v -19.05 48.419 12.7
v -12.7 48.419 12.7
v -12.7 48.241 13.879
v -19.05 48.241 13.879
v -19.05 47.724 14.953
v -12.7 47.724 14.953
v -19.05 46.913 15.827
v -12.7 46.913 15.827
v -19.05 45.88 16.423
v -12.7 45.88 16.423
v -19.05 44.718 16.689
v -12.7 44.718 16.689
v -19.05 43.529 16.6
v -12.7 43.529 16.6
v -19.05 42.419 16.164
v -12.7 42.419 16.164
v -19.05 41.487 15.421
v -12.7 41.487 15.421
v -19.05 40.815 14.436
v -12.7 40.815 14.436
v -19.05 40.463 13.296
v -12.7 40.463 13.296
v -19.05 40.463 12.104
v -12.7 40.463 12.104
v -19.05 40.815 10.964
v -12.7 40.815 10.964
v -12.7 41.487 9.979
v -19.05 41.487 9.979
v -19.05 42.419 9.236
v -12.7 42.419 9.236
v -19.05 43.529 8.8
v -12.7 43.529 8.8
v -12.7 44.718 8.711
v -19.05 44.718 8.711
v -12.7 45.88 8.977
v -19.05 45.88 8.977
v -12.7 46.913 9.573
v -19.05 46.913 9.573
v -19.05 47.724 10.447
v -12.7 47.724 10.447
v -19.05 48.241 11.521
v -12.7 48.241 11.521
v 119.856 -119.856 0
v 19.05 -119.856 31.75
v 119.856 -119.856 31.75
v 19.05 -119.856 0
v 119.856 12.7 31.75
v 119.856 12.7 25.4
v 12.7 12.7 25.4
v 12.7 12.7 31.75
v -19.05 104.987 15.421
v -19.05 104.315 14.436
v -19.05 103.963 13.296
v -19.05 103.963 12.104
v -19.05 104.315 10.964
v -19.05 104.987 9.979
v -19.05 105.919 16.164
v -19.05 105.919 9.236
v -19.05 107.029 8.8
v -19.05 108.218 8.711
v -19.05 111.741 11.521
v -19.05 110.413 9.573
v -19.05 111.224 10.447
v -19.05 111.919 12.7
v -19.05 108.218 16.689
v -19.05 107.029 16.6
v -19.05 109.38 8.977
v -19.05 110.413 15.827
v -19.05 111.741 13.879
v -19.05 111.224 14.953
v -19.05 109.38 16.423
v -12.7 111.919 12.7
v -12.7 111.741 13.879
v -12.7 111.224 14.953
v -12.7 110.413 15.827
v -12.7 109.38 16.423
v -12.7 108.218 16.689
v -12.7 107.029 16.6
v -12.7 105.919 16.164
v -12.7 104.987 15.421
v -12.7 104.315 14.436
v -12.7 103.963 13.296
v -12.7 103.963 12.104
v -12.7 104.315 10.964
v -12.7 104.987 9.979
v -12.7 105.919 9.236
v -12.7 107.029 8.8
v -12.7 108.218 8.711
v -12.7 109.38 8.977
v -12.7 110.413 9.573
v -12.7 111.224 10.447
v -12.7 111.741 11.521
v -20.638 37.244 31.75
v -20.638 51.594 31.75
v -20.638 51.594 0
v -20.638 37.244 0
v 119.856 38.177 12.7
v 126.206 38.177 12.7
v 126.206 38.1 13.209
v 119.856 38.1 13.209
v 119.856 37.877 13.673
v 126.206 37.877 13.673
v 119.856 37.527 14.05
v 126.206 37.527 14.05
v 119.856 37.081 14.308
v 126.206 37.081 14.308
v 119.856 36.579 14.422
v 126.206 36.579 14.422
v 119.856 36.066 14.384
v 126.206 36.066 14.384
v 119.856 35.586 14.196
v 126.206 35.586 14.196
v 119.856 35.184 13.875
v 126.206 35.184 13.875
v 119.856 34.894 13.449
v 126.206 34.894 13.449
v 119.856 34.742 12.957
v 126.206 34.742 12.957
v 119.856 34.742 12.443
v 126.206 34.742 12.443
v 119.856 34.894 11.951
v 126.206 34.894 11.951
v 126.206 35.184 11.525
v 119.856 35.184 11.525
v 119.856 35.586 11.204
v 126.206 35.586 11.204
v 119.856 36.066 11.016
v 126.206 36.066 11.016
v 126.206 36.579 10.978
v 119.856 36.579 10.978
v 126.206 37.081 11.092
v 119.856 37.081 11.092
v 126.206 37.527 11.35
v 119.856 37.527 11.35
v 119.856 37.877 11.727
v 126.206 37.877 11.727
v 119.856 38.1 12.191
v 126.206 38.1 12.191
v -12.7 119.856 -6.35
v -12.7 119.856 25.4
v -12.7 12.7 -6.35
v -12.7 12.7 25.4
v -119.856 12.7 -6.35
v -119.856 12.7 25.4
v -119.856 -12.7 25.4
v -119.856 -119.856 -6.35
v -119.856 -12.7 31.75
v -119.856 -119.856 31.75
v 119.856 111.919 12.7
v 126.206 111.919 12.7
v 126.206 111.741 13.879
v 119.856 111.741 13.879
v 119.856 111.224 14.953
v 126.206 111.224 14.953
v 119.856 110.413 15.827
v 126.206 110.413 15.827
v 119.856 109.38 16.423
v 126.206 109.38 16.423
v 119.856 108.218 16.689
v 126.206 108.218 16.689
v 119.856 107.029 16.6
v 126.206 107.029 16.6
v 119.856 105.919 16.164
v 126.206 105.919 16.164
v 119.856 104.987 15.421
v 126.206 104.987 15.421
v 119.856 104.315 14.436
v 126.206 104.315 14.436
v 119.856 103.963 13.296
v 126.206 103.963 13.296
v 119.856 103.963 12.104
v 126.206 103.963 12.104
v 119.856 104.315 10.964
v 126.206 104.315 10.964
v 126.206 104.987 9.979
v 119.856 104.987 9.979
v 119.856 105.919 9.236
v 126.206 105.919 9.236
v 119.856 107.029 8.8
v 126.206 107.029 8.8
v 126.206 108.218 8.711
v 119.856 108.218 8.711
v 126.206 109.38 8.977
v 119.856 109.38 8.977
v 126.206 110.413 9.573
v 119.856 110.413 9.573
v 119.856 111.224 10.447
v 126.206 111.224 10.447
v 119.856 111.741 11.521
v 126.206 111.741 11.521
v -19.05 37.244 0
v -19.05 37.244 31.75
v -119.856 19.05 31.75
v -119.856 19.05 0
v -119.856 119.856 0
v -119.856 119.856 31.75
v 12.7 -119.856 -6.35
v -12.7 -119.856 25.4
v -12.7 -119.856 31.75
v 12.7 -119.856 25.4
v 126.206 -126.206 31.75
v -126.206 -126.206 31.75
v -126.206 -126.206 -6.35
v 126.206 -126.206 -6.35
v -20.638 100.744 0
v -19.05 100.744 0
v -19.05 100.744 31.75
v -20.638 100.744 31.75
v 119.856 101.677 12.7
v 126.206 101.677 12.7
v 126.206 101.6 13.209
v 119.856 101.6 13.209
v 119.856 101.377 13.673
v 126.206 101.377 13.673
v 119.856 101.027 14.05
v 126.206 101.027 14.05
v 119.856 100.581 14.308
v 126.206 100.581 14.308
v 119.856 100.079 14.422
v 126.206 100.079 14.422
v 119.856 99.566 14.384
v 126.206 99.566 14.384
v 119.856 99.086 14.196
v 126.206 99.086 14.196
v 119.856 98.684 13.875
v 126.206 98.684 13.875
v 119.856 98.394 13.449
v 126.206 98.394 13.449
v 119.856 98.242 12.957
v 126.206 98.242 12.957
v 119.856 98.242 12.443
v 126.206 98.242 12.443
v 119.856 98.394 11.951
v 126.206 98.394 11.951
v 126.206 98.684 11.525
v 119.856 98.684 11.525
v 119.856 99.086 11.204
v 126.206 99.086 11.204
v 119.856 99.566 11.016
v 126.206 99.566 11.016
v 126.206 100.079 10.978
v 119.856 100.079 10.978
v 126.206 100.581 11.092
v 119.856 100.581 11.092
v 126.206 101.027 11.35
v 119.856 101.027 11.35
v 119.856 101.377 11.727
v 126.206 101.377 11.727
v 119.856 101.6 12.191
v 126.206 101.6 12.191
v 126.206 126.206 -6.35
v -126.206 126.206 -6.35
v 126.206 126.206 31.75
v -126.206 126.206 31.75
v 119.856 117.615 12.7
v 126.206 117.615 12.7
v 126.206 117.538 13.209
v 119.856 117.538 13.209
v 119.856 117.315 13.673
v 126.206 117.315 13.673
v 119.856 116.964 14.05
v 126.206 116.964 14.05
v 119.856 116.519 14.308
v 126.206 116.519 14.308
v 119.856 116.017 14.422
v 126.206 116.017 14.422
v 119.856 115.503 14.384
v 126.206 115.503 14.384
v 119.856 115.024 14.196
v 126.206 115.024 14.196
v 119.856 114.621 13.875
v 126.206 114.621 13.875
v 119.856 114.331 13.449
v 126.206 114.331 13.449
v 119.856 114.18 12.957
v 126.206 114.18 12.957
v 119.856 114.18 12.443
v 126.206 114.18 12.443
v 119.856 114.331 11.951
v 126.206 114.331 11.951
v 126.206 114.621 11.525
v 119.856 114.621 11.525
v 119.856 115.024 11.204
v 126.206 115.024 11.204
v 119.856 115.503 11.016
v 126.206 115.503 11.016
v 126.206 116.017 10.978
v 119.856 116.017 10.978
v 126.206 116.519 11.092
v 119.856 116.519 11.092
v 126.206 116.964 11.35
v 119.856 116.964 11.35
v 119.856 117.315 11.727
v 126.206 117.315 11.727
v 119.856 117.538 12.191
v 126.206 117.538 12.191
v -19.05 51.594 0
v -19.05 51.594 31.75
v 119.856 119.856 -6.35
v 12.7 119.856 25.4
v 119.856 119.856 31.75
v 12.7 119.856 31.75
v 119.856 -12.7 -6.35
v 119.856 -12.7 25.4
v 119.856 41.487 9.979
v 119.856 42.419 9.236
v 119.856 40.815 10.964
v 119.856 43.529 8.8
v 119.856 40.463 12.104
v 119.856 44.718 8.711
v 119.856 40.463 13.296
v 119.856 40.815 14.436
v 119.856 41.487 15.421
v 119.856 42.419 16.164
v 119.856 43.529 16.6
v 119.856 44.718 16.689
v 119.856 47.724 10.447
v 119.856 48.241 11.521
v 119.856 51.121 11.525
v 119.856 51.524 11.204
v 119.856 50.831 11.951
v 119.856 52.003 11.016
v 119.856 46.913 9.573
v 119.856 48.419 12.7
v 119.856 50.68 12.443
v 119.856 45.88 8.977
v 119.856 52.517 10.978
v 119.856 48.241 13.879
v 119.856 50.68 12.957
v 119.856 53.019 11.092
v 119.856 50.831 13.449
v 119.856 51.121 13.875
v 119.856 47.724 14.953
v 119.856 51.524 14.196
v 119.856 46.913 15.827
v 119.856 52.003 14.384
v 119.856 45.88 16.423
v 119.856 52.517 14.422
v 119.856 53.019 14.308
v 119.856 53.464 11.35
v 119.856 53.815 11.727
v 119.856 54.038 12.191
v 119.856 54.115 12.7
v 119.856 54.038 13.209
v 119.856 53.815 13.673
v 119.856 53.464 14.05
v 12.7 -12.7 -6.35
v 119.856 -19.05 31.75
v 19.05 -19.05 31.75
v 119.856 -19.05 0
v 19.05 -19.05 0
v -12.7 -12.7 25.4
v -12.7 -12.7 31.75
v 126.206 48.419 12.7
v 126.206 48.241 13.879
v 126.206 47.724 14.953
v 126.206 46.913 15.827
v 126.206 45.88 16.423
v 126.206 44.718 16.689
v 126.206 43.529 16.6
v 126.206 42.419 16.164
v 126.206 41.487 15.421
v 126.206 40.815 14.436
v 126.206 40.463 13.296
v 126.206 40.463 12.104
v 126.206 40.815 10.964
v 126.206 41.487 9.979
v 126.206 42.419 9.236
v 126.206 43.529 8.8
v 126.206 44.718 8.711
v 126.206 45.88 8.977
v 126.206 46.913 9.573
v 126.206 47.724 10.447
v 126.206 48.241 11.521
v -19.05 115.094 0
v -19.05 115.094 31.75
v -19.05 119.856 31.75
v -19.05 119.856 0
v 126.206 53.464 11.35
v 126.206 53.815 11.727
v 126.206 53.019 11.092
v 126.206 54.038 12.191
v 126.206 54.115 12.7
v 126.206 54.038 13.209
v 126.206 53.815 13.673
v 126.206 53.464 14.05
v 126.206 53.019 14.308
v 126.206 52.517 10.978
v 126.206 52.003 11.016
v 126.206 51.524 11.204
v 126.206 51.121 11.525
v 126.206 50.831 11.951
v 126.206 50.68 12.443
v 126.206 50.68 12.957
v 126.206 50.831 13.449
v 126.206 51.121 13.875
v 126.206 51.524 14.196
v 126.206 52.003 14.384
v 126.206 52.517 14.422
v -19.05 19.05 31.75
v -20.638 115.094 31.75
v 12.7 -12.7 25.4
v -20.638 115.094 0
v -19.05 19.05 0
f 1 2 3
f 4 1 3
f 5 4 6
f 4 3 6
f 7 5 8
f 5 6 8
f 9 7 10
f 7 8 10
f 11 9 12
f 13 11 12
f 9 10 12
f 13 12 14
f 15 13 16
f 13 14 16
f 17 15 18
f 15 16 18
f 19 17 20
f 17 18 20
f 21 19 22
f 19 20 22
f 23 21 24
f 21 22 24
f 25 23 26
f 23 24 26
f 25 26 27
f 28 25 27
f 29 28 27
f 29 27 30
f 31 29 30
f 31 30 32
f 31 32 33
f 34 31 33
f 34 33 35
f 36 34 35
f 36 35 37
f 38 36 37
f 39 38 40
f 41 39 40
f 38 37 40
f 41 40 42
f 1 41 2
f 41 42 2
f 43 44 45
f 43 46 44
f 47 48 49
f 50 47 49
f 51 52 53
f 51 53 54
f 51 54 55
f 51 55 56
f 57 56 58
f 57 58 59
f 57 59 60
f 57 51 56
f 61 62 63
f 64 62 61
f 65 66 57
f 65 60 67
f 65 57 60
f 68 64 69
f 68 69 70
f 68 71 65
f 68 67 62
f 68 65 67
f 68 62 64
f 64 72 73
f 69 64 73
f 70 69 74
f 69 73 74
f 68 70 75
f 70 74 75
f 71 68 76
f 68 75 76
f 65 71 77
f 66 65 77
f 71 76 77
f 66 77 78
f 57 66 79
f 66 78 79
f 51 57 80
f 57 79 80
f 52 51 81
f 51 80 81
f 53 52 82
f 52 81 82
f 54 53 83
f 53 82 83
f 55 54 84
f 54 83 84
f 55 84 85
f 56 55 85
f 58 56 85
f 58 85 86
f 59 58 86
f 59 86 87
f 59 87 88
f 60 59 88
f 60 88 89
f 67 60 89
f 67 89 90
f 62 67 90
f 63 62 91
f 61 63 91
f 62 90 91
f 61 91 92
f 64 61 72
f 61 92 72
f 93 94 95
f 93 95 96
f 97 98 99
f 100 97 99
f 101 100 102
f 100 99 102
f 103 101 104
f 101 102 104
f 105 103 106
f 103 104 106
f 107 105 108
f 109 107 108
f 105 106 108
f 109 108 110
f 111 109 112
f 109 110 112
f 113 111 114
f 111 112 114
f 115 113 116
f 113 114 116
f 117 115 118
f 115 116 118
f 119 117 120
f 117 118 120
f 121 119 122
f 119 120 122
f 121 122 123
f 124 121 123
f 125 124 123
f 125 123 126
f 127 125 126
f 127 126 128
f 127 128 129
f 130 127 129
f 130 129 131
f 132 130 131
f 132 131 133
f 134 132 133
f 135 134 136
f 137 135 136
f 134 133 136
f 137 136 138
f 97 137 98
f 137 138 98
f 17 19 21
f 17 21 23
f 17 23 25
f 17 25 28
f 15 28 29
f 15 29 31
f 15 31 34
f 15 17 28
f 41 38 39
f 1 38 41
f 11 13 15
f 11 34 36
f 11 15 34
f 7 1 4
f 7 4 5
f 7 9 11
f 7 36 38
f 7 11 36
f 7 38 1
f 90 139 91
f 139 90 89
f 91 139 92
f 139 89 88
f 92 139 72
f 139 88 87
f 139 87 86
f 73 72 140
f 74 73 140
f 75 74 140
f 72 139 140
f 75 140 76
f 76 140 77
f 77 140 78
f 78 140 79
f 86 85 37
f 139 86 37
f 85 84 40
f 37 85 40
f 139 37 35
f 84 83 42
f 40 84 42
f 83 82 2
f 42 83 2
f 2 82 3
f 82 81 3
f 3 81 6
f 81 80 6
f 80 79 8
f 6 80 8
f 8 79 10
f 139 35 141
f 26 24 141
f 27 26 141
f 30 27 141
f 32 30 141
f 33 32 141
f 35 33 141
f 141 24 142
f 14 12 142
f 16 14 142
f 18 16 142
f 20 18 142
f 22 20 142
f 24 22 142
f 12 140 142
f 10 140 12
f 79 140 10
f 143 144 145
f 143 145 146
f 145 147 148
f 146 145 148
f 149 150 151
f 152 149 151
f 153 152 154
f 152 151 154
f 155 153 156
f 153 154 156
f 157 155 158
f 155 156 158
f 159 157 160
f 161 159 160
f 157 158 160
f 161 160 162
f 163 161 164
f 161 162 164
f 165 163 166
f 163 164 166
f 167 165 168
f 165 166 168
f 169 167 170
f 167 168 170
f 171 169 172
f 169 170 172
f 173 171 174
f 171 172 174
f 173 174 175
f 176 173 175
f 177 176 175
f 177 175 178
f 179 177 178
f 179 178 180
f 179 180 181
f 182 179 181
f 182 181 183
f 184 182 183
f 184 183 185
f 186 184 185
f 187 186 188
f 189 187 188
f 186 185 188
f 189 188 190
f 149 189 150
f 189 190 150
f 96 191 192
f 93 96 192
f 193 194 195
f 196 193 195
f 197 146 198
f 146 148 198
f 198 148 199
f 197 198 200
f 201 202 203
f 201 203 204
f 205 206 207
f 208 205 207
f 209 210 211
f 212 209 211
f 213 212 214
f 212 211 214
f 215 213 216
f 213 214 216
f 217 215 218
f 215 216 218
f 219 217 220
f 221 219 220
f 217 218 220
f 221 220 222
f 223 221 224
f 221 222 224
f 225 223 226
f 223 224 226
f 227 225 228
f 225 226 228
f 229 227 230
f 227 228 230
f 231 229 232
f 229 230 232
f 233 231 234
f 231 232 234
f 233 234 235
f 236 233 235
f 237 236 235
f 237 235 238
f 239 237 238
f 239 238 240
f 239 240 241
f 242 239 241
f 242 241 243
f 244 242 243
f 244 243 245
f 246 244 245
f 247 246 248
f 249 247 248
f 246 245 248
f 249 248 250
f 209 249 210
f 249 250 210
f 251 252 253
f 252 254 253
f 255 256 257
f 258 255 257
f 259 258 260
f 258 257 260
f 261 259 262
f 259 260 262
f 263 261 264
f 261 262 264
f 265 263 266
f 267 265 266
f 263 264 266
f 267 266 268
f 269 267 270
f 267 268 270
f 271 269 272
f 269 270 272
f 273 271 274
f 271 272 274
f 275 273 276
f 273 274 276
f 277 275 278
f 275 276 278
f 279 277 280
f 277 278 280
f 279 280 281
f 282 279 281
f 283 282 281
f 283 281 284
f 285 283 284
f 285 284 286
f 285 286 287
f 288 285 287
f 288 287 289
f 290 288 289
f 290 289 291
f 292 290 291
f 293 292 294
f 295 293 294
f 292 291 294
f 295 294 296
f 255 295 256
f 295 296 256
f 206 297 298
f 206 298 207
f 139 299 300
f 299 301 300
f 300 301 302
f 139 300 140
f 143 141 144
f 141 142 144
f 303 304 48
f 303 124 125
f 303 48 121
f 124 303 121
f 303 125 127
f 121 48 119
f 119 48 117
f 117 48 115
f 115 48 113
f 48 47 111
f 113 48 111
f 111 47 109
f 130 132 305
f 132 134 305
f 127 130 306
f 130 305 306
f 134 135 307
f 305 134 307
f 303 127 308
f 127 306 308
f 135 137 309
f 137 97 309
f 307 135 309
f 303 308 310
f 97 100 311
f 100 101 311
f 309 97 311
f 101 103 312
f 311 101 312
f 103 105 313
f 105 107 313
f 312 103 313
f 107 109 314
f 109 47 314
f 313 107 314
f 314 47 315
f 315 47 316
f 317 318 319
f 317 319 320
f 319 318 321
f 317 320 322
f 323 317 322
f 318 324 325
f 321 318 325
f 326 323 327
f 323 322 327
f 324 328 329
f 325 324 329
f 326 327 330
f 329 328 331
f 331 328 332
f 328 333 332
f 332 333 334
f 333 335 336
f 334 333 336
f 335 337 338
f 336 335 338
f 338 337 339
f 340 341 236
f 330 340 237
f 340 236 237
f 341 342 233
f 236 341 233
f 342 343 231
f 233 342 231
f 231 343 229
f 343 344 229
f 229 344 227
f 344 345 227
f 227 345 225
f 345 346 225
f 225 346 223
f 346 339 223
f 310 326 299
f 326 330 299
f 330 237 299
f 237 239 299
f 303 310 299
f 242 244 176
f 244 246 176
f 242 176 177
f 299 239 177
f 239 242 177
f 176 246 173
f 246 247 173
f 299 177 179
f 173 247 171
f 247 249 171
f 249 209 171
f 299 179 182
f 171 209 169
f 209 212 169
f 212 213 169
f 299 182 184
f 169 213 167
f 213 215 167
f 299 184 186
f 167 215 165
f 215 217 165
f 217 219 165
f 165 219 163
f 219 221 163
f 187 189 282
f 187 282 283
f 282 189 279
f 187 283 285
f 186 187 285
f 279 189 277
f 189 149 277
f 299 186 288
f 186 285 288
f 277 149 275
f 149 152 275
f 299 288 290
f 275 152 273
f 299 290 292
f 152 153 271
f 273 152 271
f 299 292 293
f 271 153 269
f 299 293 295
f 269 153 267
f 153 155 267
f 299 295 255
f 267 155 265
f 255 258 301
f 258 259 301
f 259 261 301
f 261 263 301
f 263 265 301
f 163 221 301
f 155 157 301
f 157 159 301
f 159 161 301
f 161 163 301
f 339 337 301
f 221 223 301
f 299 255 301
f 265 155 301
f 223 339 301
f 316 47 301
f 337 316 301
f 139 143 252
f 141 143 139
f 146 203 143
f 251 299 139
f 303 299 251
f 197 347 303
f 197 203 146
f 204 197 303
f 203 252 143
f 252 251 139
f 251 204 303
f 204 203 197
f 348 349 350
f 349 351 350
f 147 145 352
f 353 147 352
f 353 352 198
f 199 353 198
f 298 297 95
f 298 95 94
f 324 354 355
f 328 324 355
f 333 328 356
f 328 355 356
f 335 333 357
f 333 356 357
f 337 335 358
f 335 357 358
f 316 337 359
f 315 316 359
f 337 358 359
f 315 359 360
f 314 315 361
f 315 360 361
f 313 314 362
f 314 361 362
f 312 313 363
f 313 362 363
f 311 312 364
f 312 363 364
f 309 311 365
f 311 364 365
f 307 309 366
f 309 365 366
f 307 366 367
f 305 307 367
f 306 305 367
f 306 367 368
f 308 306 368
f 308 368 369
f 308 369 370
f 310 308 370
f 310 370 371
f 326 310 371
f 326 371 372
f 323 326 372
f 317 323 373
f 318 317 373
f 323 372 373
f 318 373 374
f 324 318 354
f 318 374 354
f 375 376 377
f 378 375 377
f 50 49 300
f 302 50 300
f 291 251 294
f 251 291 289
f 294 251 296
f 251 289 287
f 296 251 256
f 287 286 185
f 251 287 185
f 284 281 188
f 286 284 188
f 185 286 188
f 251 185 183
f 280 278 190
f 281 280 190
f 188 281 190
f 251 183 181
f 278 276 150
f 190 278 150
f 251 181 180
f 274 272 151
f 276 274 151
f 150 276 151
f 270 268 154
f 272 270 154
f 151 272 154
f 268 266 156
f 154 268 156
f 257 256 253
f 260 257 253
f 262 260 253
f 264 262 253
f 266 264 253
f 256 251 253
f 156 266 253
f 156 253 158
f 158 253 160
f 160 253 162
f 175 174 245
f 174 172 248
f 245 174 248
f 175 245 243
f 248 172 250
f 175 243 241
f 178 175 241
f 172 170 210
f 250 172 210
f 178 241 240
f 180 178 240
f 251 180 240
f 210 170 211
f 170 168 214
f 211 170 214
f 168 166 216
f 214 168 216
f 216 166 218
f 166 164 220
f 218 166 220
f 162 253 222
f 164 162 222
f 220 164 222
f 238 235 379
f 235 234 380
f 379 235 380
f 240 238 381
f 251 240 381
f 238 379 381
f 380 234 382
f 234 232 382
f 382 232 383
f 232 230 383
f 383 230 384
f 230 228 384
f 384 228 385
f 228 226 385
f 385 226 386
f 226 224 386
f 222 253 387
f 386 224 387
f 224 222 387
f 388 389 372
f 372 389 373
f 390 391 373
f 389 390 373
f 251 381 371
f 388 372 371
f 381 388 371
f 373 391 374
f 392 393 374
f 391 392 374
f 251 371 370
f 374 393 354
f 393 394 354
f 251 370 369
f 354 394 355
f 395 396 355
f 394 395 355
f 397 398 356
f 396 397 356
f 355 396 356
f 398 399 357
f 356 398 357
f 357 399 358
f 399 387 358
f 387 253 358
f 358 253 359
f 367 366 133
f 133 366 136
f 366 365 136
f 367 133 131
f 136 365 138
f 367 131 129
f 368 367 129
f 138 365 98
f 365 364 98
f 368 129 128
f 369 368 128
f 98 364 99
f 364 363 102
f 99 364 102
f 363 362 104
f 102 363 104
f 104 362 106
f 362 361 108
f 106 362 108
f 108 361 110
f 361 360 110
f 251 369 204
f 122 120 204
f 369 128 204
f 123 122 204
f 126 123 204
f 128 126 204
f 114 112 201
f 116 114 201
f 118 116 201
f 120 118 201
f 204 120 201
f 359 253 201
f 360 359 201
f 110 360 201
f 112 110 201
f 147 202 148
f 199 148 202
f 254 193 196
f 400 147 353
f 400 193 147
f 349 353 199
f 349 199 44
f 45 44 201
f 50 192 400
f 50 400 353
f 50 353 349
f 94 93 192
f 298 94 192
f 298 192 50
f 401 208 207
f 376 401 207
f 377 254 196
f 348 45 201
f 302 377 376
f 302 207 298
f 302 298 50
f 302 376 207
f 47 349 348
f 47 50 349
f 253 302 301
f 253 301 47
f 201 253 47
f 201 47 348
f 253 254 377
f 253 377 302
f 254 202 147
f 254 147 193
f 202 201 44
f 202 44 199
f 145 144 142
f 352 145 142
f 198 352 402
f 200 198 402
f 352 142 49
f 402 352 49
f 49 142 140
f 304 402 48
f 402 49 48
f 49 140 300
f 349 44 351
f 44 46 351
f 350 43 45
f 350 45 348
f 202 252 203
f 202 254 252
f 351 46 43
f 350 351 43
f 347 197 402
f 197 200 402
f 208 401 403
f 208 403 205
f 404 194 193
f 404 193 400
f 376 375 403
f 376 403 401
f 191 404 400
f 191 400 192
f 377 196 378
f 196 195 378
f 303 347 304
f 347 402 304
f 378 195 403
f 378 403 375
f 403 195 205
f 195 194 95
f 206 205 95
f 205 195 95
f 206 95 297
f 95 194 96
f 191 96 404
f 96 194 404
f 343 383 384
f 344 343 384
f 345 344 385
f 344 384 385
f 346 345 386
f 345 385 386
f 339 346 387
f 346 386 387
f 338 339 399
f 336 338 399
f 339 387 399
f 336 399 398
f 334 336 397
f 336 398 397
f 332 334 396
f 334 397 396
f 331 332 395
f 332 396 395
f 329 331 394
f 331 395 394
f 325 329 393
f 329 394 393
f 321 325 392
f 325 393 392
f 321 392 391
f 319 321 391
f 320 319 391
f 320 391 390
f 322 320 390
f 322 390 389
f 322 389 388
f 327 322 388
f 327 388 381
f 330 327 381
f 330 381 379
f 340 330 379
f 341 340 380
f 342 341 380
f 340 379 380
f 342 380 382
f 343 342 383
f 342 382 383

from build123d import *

# Parameters (mm, degrees)
F0_W      = 252.4125
F0_H      = 252.4125
F0_W_2    = 100.80625
F0_H_2    = 100.80625
F1_DEPTH  = 25.4
F2_W      = 100.80625
F2_H      = 100.80625
F3_DEPTH  = 6.35
F4_R      = 4
F4_R_2    = 1.7272
F5_DEPTH  = 6.35
F6_W      = 14.3500094
F6_H      = 31.75
F7_DEPTH  = 1.5875
F8_R      = 4
F9_DEPTH  = 6.35
F10_W     = 252.4125
F10_H     = 252.4125
F10_W_2   = 100.80625
F10_H_2   = 100.80625
F10_W_3   = 1.5875
F10_H_3   = 14.3500094
F11_DEPTH = 6.35


with BuildPart() as f1:
    # F0 (on Top) → F1 (new body)
    with BuildSketch(Plane.XY):
        Rectangle(F0_W, F0_H)
        Polygon((12.7, -12.7), (12.7, -119.85625), (-119.85625, -119.85625), (-119.85625, 12.7), (-12.7, 12.7), (-12.7, 119.85625), (119.85625, 119.85625), (119.85625, -12.7), align=None, mode=Mode.SUBTRACT)
        with Locations((69.453125, -69.453125)):
            Rectangle(F0_W_2, F0_H_2, mode=Mode.SUBTRACT)
        with Locations((-69.453125, 69.453125)):
            Rectangle(F0_W_2, F0_H_2, mode=Mode.SUBTRACT)
    extrude(amount=F1_DEPTH)

    # F2 (on face) → F3 (join)
    with BuildSketch(Plane.XY.offset(25.4)):
        Polygon((126.20625, -126.20625), (126.20625, 12.7), (119.85625, 12.7), (119.85625, -12.7), (12.7, -12.7), (12.7, -119.85625), (-12.7, -119.85625), (-12.7, -126.20625), align=None)
        with Locations((69.453125, -69.453125)):
            Rectangle(F2_W, F2_H, mode=Mode.SUBTRACT)
        Polygon((12.7, 126.20625), (-126.20625, 126.20625), (-126.20625, -12.7), (-119.85625, -12.7), (-119.85625, 12.7), (-12.7, 12.7), (-12.7, 119.85625), (12.7, 119.85625), align=None)
        with Locations((-69.453125, 69.453125)):
            Rectangle(F2_W, F2_H, mode=Mode.SUBTRACT)
        Polygon((12.7, 12.7), (12.7, 119.85625), (-12.7, 119.85625), (-12.7, 12.7), (-119.85625, 12.7), (-119.85625, -12.7), (-12.7, -12.7), (-12.7, -119.85625), (12.7, -119.85625), (12.7, -12.7), (119.85625, -12.7), (119.85625, 12.7), align=None)
        Polygon((-119.85625, -12.7), (-126.20625, -12.7), (-126.20625, -126.20625), (-12.7, -126.20625), (-12.7, -119.85625), (-119.85625, -119.85625), align=None)
        Polygon((126.20625, 126.20625), (12.7, 126.20625), (12.7, 119.85625), (119.85625, 119.85625), (119.85625, 12.7), (126.20625, 12.7), align=None)
    extrude(amount=F3_DEPTH)

    # F4 (on face) → F5 (cut, through all)
    with BuildSketch(Plane.YZ.offset(126.20625)):
        with Locations((107.91875, 12.7)):
            Circle(F4_R)
        with Locations((115.8875, 12.7)):
            Circle(F4_R_2)
        with Locations((99.95, 12.7)):
            Circle(F4_R_2)
        with Locations((44.41875, 12.7)):
            Circle(F4_R)
        with Locations((52.3875, 12.7)):
            Circle(F4_R_2)
        with Locations((36.45, 12.7)):
            Circle(F4_R_2)
    extrude(amount=-F5_DEPTH, mode=Mode.SUBTRACT)

    # F6 (on face) → F7 (join)
    with BuildSketch(Plane(origin=(-19.05, 0, 0), x_dir=(0, -1, 0), z_dir=(-1, 0, 0))):
        with Locations((-44.41875, 15.875)):
            Rectangle(F6_W, F6_H)
        with Locations((-107.91875, 15.875)):
            Rectangle(F6_W, F6_H)
    extrude(amount=F7_DEPTH)

    # F8 (on face) → F9 (cut, through all)
    with BuildSketch(Plane.YZ.offset(-12.7)):
        with Locations((44.41875, 12.7)):
            Circle(F8_R)
        with Locations((107.91875, 12.7)):
            Circle(F8_R)
    extrude(amount=-F9_DEPTH, mode=Mode.SUBTRACT)

    # F10 (on face) → F11 (join)
    with BuildSketch(Plane(origin=(0, 0, 0), x_dir=(1, 0, 0), z_dir=(0, 0, -1))):
        Rectangle(F10_W, F10_H)
        Polygon((-119.85625, -19.05), (-19.05, -19.05), (-19.05, -37.2437453), (-19.05, -51.5937547), (-19.05, -100.7437453), (-19.05, -115.0937547), (-19.05, -119.85625), (-119.85625, -119.85625), align=None, mode=Mode.SUBTRACT)
        Polygon((-119.85625, 119.85625), (12.7, 119.85625), (12.7, 12.7), (119.85625, 12.7), (119.85625, -119.85625), (-12.7, -119.85625), (-12.7, -12.7), (-119.85625, -12.7), align=None, mode=Mode.SUBTRACT)
        with Locations((69.453125, 69.453125)):
            Rectangle(F10_W_2, F10_H_2, mode=Mode.SUBTRACT)
        with Locations((69.453125, 69.453125)):
            Rectangle(F10_W_2, F10_H_2)
        Polygon((-19.05, -37.2437453), (-19.05, -19.05), (-119.85625, -19.05), (-119.85625, -119.85625), (-19.05, -119.85625), (-19.05, -115.0937547), (-20.6375, -115.0937547), (-20.6375, -100.7437453), (-19.05, -100.7437453), (-19.05, -51.5937547), (-20.6375, -51.5937547), (-20.6375, -37.2437453), align=None)
        with Locations((-19.84375, -44.41875)):
            Rectangle(F10_W_3, F10_H_3)
        with Locations((-19.84375, -107.91875)):
            Rectangle(F10_W_3, F10_H_3)
    extrude(amount=F11_DEPTH)


solid = f1.part
